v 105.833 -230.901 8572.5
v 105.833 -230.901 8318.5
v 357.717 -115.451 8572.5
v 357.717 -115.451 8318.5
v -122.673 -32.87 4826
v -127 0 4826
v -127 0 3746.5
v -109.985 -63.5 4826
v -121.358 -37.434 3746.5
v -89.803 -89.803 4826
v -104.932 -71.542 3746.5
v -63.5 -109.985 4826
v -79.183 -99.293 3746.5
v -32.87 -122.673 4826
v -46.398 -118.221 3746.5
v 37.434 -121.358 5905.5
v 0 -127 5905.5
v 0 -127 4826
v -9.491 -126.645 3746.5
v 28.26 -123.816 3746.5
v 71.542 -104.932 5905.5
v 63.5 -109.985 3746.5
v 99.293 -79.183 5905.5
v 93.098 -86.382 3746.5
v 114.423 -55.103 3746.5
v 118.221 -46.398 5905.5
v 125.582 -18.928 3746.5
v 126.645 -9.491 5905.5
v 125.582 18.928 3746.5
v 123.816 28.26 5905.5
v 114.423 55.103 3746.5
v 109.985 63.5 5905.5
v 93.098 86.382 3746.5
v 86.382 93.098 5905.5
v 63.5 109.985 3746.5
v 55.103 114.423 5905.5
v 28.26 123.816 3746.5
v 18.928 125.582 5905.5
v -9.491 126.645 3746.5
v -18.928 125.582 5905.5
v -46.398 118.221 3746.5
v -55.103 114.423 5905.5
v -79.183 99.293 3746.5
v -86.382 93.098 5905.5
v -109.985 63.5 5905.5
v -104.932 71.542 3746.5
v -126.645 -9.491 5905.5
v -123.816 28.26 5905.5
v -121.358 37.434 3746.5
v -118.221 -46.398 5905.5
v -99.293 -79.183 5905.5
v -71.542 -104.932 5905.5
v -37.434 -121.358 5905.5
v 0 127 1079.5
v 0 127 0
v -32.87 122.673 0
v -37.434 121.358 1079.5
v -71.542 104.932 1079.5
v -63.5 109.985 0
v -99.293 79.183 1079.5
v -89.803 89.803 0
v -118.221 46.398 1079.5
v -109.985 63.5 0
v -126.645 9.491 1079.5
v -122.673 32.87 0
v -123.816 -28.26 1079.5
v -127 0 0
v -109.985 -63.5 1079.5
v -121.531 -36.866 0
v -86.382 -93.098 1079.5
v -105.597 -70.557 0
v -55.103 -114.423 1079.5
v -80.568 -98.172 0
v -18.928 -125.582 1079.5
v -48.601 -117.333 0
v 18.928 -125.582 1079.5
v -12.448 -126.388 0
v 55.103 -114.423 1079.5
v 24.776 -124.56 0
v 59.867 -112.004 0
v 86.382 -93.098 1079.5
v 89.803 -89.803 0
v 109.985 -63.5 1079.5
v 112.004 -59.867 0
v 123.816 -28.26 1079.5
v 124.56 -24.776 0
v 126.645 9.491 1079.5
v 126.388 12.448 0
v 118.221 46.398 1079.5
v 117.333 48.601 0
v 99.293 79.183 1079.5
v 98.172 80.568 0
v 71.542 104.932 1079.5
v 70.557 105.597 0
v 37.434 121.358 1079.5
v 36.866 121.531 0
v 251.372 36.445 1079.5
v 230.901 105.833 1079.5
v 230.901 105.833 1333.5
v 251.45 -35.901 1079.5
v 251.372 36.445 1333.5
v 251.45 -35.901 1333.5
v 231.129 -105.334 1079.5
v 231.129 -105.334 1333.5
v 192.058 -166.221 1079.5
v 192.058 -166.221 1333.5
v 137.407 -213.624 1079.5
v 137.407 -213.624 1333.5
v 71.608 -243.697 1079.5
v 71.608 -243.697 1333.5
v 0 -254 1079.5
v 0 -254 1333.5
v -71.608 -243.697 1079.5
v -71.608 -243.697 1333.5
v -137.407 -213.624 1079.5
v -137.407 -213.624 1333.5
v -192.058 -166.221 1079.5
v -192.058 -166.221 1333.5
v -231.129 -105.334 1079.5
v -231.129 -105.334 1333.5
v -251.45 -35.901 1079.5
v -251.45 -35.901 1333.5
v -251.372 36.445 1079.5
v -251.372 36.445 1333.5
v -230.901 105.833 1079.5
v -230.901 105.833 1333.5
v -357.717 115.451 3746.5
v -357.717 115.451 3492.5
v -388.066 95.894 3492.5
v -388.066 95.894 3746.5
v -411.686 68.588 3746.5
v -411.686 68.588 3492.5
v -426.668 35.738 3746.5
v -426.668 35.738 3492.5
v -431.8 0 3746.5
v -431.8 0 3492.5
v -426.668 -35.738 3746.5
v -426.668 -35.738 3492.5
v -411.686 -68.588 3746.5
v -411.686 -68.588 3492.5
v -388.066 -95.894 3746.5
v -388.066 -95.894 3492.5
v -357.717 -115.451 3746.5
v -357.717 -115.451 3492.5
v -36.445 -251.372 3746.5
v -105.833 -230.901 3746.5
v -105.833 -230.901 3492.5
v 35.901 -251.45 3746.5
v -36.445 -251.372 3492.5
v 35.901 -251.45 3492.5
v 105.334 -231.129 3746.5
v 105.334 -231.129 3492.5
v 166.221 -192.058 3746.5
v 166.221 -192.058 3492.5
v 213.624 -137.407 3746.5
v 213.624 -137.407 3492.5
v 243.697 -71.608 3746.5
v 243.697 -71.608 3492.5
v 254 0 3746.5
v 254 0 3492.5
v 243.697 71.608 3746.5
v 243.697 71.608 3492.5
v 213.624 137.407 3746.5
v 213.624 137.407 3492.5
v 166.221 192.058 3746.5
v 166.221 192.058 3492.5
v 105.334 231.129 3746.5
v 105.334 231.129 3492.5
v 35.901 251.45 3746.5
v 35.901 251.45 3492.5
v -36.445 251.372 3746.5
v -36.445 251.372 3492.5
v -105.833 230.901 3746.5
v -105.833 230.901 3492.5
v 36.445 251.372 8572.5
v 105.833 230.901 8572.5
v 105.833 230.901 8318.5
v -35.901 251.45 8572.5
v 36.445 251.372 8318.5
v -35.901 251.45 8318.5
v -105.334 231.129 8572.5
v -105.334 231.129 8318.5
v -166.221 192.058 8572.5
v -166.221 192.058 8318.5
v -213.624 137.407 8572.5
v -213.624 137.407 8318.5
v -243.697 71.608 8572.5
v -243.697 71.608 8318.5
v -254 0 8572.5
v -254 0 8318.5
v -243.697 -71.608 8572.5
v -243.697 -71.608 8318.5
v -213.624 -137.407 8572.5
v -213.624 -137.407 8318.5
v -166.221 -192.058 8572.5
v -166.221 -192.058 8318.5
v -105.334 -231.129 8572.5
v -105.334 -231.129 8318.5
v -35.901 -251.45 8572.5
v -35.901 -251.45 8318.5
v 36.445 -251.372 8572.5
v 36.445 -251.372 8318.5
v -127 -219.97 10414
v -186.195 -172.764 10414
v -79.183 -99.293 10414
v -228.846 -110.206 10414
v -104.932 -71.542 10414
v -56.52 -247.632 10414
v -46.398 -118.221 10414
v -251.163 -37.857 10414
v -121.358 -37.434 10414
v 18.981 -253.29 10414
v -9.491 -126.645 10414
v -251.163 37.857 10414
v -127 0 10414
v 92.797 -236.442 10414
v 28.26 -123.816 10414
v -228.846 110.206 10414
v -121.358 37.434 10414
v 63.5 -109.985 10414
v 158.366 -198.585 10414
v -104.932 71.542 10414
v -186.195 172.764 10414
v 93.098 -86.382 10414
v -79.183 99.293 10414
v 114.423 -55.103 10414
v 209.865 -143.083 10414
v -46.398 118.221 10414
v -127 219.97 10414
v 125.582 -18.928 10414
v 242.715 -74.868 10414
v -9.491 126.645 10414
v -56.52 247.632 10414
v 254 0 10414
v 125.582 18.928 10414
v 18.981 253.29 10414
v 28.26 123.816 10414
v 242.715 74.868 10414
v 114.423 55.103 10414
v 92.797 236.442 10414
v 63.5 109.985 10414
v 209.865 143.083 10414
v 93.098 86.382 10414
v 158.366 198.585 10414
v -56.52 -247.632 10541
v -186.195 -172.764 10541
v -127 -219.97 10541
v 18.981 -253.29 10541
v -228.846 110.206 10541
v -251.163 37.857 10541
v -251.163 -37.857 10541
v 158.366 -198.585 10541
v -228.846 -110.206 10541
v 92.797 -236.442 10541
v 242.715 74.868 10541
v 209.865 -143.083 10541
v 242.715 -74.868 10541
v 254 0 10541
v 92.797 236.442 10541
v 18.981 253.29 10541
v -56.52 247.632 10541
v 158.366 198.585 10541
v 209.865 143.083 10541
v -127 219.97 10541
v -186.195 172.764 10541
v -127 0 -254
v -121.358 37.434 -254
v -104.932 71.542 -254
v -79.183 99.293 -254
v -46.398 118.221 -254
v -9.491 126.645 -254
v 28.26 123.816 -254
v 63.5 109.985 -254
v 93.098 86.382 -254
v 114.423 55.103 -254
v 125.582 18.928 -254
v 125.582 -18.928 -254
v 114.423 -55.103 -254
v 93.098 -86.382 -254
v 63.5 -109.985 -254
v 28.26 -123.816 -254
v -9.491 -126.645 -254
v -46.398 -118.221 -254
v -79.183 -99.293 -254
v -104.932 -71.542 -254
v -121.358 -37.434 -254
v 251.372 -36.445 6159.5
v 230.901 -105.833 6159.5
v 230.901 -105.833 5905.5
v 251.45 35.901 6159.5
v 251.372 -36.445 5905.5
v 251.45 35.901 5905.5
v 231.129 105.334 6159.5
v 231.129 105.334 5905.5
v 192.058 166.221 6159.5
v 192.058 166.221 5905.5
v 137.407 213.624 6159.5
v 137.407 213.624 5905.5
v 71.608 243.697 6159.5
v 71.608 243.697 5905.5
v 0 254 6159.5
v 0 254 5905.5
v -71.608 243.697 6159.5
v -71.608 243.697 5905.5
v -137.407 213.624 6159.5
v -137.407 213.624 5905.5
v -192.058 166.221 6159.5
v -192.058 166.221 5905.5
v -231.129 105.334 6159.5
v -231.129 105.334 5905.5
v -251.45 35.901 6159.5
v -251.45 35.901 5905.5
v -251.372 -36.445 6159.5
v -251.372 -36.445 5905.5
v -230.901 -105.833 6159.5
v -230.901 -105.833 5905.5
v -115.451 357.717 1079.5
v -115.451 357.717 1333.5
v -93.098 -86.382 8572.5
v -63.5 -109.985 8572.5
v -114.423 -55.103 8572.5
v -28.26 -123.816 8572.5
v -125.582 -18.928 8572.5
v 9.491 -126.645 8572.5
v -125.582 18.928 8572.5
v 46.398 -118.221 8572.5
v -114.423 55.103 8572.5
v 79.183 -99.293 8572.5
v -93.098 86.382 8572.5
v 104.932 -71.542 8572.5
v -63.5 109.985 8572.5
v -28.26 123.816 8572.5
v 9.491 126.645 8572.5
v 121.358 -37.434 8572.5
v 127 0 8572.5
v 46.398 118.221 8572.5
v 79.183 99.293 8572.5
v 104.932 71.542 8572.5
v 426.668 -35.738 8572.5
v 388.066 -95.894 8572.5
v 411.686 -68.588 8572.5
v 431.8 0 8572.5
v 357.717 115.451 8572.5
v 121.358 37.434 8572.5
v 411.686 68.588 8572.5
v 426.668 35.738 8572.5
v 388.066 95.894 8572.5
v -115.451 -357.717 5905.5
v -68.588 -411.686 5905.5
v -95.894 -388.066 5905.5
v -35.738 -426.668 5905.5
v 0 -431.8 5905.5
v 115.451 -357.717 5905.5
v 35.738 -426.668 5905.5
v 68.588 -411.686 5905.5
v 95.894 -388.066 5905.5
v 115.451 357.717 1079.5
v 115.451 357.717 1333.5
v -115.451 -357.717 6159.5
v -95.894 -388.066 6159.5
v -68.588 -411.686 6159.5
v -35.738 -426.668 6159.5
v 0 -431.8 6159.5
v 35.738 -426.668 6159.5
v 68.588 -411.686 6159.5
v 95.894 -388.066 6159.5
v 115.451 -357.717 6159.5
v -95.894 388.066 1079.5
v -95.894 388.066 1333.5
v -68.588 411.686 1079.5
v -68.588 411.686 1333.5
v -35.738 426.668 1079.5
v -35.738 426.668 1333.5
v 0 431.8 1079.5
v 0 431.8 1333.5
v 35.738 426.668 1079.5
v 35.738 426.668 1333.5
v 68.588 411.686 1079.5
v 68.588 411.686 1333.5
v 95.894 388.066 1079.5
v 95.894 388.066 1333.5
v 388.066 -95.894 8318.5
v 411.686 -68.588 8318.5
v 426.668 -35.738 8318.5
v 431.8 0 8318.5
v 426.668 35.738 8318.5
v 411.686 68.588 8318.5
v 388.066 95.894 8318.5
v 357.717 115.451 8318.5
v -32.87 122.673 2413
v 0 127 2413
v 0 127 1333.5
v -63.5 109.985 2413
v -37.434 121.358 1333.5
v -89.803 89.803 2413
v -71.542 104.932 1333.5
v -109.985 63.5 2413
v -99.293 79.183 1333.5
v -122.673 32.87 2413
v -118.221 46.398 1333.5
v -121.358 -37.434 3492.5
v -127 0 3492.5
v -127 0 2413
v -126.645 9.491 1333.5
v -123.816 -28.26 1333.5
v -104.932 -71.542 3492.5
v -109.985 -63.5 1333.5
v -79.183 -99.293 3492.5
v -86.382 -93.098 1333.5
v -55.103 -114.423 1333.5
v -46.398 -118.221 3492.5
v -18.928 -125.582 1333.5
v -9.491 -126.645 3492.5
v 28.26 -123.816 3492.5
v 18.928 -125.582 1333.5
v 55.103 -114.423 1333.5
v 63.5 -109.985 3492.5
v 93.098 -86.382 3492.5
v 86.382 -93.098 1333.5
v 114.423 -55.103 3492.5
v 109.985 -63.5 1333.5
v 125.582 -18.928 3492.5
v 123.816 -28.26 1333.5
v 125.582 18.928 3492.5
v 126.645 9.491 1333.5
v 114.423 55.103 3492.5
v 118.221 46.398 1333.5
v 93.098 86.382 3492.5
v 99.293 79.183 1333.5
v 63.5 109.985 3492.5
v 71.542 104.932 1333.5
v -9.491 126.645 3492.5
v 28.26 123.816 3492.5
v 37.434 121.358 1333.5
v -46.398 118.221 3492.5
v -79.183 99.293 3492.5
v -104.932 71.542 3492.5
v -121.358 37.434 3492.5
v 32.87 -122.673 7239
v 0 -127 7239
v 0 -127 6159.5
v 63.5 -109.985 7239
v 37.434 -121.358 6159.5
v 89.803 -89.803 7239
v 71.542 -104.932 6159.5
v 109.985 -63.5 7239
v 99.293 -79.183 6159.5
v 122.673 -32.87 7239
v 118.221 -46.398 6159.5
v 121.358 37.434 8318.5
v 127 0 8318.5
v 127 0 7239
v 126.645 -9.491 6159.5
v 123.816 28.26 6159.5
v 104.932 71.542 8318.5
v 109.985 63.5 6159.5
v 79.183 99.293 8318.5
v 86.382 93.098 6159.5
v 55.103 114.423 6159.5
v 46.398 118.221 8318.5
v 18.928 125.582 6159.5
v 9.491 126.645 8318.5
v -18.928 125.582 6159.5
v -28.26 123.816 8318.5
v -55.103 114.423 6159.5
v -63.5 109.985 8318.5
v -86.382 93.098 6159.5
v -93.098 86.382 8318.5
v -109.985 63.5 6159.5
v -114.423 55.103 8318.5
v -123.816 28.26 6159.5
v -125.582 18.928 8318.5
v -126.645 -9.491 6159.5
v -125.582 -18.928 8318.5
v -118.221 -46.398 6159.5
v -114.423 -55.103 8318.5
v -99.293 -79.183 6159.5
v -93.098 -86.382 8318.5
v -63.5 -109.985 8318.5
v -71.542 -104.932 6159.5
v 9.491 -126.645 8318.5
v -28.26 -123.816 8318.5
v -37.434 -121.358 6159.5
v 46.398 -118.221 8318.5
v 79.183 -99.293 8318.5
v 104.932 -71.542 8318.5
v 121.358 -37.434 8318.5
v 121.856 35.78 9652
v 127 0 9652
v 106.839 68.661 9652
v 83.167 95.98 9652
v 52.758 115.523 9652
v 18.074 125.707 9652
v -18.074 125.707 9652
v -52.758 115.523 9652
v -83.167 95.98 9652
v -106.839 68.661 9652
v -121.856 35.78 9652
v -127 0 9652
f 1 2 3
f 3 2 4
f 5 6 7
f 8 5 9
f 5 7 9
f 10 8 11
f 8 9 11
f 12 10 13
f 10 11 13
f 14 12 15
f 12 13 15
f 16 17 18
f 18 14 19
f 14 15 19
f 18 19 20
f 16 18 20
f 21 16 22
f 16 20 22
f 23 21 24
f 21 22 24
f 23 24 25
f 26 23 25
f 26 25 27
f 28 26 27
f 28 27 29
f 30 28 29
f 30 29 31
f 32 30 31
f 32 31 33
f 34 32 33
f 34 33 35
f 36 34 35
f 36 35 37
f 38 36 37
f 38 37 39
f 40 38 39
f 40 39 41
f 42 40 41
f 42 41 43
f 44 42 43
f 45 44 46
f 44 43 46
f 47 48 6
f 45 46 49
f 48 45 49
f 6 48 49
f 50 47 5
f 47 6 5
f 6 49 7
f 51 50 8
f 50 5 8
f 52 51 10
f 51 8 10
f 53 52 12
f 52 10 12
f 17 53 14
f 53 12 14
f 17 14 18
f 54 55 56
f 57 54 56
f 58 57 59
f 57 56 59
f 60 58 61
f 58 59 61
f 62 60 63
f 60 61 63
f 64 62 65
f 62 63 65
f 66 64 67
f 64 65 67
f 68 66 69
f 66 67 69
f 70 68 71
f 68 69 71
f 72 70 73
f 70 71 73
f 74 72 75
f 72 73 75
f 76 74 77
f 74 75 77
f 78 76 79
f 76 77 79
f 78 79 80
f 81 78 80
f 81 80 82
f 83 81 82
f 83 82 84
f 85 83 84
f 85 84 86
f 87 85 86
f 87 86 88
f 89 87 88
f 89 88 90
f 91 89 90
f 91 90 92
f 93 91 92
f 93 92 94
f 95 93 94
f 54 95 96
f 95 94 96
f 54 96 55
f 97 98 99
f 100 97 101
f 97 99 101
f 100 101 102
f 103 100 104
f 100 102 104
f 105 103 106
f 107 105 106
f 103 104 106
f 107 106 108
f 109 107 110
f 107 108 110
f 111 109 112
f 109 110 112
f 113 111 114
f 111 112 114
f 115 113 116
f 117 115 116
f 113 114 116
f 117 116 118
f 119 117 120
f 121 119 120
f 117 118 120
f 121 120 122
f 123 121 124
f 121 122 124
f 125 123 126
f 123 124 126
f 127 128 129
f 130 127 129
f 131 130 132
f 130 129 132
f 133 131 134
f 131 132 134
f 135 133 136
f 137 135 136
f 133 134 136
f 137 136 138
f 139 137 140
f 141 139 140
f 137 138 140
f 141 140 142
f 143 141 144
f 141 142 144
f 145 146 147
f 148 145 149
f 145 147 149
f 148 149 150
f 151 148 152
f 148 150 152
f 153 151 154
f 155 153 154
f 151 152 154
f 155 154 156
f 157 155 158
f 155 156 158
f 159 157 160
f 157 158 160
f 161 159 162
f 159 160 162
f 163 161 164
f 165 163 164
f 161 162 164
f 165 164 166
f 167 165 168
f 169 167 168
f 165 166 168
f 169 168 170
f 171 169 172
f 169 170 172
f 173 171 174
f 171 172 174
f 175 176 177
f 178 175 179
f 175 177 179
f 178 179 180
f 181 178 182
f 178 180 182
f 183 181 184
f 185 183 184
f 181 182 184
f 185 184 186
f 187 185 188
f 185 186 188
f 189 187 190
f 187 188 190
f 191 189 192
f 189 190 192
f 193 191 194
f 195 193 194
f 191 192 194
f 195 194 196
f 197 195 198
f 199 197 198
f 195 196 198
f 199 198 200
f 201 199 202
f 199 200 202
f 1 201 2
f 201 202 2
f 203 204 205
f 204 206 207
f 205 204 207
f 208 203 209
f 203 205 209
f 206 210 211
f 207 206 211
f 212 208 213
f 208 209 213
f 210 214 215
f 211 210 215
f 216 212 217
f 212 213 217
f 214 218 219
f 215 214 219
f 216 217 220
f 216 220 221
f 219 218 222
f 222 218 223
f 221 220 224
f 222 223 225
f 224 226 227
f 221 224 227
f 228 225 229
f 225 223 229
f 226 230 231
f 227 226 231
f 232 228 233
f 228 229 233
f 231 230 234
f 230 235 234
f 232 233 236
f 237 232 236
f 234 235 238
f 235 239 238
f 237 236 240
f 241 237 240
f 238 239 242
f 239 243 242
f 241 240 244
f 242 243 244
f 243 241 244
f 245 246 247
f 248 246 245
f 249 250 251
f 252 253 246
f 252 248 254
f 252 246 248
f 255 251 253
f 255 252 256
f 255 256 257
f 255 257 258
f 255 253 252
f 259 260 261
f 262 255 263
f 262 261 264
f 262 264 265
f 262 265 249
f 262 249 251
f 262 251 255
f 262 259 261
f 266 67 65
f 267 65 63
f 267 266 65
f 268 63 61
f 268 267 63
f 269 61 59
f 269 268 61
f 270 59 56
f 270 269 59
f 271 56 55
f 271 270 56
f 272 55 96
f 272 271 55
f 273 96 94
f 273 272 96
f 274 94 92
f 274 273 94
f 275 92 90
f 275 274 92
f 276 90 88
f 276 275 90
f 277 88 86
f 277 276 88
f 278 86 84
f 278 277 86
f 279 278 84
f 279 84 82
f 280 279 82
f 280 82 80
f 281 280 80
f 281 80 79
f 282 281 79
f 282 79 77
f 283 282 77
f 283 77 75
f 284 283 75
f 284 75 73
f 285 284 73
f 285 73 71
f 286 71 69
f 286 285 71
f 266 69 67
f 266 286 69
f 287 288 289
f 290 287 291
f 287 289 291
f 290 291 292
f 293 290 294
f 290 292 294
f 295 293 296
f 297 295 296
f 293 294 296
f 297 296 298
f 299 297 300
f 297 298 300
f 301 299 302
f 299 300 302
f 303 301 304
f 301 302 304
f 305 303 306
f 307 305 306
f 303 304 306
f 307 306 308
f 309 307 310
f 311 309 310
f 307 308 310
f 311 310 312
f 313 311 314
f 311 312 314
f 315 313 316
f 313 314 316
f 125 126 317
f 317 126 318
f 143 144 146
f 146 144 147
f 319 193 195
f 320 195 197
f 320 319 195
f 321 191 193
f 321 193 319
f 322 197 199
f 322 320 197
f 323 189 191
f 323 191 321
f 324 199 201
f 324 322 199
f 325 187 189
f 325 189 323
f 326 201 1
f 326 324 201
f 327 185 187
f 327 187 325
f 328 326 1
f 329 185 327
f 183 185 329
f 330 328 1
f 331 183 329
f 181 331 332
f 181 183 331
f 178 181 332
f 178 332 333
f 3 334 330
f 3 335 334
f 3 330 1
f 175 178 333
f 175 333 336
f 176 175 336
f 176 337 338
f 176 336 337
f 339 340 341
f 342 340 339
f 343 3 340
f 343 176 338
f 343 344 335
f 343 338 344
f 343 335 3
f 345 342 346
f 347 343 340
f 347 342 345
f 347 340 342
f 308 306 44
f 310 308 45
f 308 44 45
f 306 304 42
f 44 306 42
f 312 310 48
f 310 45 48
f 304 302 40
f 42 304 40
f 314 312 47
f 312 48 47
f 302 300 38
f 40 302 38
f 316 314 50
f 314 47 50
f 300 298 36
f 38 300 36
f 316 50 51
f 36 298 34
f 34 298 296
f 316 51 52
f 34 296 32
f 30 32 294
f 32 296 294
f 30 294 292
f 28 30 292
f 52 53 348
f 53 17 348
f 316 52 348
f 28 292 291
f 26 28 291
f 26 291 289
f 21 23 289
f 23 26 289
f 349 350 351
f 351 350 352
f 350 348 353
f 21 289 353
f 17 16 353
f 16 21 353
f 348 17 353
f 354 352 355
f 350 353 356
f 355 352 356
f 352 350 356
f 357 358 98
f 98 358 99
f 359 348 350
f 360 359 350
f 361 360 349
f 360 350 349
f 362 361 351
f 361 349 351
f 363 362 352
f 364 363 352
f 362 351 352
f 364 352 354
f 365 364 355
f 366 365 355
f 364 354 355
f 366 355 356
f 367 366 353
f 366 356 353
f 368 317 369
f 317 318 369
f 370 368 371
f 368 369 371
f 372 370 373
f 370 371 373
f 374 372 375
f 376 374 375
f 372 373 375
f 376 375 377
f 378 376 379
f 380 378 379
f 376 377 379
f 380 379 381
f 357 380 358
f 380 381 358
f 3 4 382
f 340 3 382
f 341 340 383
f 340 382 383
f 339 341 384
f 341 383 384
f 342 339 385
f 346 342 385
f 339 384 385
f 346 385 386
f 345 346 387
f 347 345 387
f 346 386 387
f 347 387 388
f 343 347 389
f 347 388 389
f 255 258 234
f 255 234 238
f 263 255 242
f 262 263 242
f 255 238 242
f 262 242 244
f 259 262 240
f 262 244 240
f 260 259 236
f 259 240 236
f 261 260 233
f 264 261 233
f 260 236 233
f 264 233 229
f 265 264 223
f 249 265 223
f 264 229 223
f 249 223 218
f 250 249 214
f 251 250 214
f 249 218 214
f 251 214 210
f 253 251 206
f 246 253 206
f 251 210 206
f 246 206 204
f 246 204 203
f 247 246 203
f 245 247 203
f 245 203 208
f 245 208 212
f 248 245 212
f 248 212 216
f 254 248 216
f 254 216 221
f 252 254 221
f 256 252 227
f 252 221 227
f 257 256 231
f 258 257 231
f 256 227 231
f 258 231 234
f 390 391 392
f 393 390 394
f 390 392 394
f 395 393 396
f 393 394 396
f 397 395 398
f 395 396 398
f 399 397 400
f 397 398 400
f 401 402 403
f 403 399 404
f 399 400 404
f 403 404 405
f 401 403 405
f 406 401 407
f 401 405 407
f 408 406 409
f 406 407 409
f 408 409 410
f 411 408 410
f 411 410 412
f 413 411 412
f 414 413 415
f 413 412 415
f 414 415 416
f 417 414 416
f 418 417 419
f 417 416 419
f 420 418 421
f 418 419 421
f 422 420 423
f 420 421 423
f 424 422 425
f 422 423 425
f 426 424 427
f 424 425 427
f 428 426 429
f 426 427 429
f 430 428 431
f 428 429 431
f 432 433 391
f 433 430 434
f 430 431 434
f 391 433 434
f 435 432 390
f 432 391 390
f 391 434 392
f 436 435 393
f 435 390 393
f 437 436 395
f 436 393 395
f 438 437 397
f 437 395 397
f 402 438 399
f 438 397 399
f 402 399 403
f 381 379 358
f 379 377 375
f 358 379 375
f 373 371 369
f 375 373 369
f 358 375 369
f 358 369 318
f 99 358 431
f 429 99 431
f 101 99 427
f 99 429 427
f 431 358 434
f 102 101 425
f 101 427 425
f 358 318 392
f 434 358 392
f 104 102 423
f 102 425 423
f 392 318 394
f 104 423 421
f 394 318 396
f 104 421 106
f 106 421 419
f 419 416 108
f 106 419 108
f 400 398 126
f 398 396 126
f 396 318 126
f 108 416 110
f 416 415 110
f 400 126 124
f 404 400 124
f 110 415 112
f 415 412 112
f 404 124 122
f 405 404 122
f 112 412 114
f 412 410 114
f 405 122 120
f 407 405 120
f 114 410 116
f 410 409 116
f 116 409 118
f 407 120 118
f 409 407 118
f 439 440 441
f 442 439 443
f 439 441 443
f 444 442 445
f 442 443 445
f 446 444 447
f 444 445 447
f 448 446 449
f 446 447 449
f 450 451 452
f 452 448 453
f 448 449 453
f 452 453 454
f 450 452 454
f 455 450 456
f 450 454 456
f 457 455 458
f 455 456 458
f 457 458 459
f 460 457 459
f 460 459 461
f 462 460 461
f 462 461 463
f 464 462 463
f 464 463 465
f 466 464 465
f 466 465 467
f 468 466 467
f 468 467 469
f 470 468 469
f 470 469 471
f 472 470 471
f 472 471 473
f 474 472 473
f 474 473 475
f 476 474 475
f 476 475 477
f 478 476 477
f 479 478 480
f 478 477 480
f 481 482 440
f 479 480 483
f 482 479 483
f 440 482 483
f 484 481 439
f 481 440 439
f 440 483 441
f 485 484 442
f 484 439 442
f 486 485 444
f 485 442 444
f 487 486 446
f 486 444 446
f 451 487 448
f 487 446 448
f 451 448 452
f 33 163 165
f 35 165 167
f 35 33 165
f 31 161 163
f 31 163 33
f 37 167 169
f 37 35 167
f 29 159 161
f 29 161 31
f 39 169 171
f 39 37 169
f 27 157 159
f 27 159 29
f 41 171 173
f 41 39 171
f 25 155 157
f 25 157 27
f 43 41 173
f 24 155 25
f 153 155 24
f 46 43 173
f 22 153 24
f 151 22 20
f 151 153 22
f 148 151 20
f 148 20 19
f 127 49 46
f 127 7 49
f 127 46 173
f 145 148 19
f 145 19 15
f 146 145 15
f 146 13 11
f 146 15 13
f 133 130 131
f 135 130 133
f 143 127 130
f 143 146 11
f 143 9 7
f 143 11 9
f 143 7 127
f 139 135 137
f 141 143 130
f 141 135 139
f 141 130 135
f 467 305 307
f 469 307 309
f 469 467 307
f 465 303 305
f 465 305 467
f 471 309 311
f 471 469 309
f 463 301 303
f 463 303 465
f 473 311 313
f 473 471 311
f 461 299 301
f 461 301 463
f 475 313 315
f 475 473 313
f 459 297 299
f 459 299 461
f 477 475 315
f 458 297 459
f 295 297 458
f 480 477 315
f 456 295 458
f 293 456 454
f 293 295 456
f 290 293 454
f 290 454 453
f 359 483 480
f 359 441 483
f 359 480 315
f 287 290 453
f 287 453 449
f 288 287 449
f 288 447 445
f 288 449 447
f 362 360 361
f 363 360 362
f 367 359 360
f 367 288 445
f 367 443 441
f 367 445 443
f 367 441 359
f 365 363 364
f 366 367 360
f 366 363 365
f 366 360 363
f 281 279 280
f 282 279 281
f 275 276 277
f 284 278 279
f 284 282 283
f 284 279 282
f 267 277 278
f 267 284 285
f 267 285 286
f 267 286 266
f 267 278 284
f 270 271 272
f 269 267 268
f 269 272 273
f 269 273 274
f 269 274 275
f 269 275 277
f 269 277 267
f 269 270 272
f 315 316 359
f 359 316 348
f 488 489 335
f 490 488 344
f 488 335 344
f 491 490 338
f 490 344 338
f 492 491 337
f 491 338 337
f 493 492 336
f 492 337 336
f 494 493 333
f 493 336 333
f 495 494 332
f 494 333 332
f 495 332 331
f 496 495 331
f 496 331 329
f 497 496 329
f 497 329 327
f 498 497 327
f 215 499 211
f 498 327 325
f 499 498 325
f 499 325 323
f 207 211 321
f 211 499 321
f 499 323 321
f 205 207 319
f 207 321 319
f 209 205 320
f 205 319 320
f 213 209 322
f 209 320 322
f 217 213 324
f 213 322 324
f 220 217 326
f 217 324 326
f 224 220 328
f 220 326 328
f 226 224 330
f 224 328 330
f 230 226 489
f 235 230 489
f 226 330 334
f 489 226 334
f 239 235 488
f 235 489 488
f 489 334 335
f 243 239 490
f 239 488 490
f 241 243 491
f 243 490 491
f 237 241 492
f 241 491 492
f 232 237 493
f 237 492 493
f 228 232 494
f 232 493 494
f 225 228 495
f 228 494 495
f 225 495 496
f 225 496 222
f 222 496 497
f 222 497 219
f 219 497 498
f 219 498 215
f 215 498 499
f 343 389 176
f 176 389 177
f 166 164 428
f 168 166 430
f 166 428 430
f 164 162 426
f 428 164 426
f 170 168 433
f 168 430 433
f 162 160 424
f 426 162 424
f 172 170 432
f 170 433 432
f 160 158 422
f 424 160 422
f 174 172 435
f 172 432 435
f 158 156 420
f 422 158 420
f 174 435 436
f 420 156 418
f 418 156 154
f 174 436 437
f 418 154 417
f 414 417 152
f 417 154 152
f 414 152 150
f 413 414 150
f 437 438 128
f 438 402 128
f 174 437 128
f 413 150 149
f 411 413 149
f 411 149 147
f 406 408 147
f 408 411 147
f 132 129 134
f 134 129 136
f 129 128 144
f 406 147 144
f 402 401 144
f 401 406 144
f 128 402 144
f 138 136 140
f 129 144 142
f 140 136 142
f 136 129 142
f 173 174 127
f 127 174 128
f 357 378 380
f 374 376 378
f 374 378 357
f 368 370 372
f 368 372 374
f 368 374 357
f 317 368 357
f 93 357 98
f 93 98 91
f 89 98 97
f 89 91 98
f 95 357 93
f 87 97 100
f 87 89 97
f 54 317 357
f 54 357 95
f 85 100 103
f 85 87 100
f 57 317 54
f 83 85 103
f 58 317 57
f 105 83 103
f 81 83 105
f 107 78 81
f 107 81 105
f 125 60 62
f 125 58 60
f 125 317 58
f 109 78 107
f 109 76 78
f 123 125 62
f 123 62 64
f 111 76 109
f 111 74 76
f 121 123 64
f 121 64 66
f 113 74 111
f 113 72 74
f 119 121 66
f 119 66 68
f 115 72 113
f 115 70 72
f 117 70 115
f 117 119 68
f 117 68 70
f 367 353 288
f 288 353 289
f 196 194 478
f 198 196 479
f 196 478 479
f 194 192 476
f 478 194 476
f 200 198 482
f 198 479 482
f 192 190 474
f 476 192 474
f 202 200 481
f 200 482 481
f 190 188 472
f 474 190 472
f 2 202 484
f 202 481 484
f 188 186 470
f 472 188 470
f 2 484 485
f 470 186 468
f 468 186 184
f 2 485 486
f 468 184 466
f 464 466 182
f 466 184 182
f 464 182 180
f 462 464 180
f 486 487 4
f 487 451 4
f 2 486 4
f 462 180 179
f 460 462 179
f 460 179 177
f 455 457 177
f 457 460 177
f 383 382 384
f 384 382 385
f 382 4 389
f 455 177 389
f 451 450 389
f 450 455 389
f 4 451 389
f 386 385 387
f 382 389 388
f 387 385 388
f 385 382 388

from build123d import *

# Parameters (mm, degrees)
SKETCH1_R                   = 127
BOSS_EXTRUDE1_DEPTH         = 2413
BOSS_EXTRUDE2_DEPTH         = 127
BODY_MOVE_COPY1_START       = 7239
BODY_MOVE_COPY1_OUTLINE_R   = 127
BODY_MOVE_COPY1_DEPTH       = 2413
BODY_MOVE_COPY1_START_2     = 8318.5
BODY_MOVE_COPY1_2_OUTLINE_R = 127
BODY_MOVE_COPY1_2_DEPTH     = 254
BODY_MOVE_COPY1_START_3     = 2413
BODY_MOVE_COPY1_3_OUTLINE_R = 127
BODY_MOVE_COPY1_3_DEPTH     = 2413
BODY_MOVE_COPY1_START_4     = 3492.5
BODY_MOVE_COPY1_4_OUTLINE_R = 127
BODY_MOVE_COPY1_4_DEPTH     = 254
BODY_MOVE_COPY1_START_5     = 4826
BODY_MOVE_COPY1_5_OUTLINE_R = 127
BODY_MOVE_COPY1_5_DEPTH     = 2413
BODY_MOVE_COPY1_START_6     = 5905.5
BODY_MOVE_COPY1_6_OUTLINE_R = 127
BODY_MOVE_COPY1_6_DEPTH     = 254
BODY_MOVE_COPY2_ANGLE       = 90
BODY_MOVE_COPY3_ANGLE       = 180
BODY_MOVE_COPY4_ANGLE       = 90
BOSS_EXTRUDE3_START         = 254
SKETCH4_R                   = 127
BOSS_EXTRUDE3_DEPTH         = 254
SKETCH5_R                   = 127
BOSS_EXTRUDE4_DEPTH         = 762
SKETCH6_R                   = 254
BOSS_EXTRUDE5_DEPTH         = 127


# Read off the part's stored shape, not the designer's step: Body-Move/Copy1
with BuildPart() as part:
    # Sketch1 → Boss-Extrude1 (new body)
    with BuildSketch(Plane.XY):
        Circle(SKETCH1_R)
    extrude(amount=BOSS_EXTRUDE1_DEPTH)

    # Sketch2 → Boss-Extrude2 (add, symmetric)
    with BuildSketch(Plane.XY.offset(1206.5)):
        with BuildLine():
            Line((105.833333333, 230.901073093), (357.716666667, 115.450536547))
            ThreePointArc((357.716666667, 115.450536547), (431.8, 0), (357.716666667, -115.450536547))
            Line((357.716666667, -115.450536547), (105.833333333, -230.901073093))
            ThreePointArc((105.833333333, -230.901073093), (-254, 0), (105.833333333, 230.901073093))
        make_face()
    extrude(amount=BOSS_EXTRUDE2_DEPTH, both=True)


with BuildPart() as body_2:
    # Body-Move/Copy1 outline → Body-Move/Copy1 (new body)
    with BuildSketch(Plane.XY.offset(BODY_MOVE_COPY1_START)):
        Circle(BODY_MOVE_COPY1_OUTLINE_R)
    extrude(amount=BODY_MOVE_COPY1_DEPTH)

    # Body-Move_Copy1 2 outline → Body-Move_Copy1 2 (add)
    with BuildSketch(Plane.XY.offset(BODY_MOVE_COPY1_START_2)):
        with BuildLine():
            ThreePointArc((105.833333333, 230.901073093), (-254, 0), (105.833333333, -230.901073093))
            Line((105.833333333, -230.901073093), (357.716666667, -115.450536547))
            ThreePointArc((357.716666667, -115.450536547), (431.8, 0), (357.716666667, 115.450536547))
            Line((357.716666667, 115.450536547), (105.833333333, 230.901073093))
        make_face()
        Circle(BODY_MOVE_COPY1_2_OUTLINE_R, mode=Mode.SUBTRACT)
    extrude(amount=BODY_MOVE_COPY1_2_DEPTH)


with BuildPart() as body_3:
    # Body-Move_Copy1 3 outline → Body-Move_Copy1 3 (new body)
    with BuildSketch(Plane.XY.offset(BODY_MOVE_COPY1_START_3)):
        Circle(BODY_MOVE_COPY1_3_OUTLINE_R)
    extrude(amount=BODY_MOVE_COPY1_3_DEPTH)

    # Body-Move_Copy1 4 outline → Body-Move_Copy1 4 (add)
    with BuildSketch(Plane.XY.offset(BODY_MOVE_COPY1_START_4)):
        with BuildLine():
            ThreePointArc((105.833333333, 230.901073093), (-254, 0), (105.833333333, -230.901073093))
            Line((105.833333333, -230.901073093), (357.716666667, -115.450536547))
            ThreePointArc((357.716666667, -115.450536547), (431.8, 0), (357.716666667, 115.450536547))
            Line((357.716666667, 115.450536547), (105.833333333, 230.901073093))
        make_face()
        Circle(BODY_MOVE_COPY1_4_OUTLINE_R, mode=Mode.SUBTRACT)
    extrude(amount=BODY_MOVE_COPY1_4_DEPTH)


with BuildPart() as body_4:
    # Body-Move_Copy1 5 outline → Body-Move_Copy1 5 (new body)
    with BuildSketch(Plane.XY.offset(BODY_MOVE_COPY1_START_5)):
        Circle(BODY_MOVE_COPY1_5_OUTLINE_R)
    extrude(amount=BODY_MOVE_COPY1_5_DEPTH)

    # Body-Move_Copy1 6 outline → Body-Move_Copy1 6 (add)
    with BuildSketch(Plane.XY.offset(BODY_MOVE_COPY1_START_6)):
        with BuildLine():
            ThreePointArc((105.833333333, 230.901073093), (-254, 0), (105.833333333, -230.901073093))
            Line((105.833333333, -230.901073093), (357.716666667, -115.450536547))
            ThreePointArc((357.716666667, -115.450536547), (431.8, 0), (357.716666667, 115.450536547))
            Line((357.716666667, 115.450536547), (105.833333333, 230.901073093))
        make_face()
        Circle(BODY_MOVE_COPY1_6_OUTLINE_R, mode=Mode.SUBTRACT)
    extrude(amount=BODY_MOVE_COPY1_6_DEPTH)


with BuildPart() as body_4_1:
    # Body-Move/Copy2: moved
    add(body_4.part.rotate(Axis((0, 0, 0), (0, 0, -1)), BODY_MOVE_COPY2_ANGLE))


with BuildPart() as body_3_1:
    # Body-Move/Copy3: moved
    add(body_3.part.rotate(Axis((0, 0, 0), (0, 0, 1)), BODY_MOVE_COPY3_ANGLE))


with BuildPart() as part_1:
    # Body-Move/Copy4: moved
    add(part.part.rotate(Axis((0, 0, 0), (0, 0, 1)), BODY_MOVE_COPY4_ANGLE))

    # Combine1: union body 2, body 4, body 3
    add(body_2.part)
    add(body_4_1.part)
    add(body_3_1.part)

    # Sketch4 → Boss-Extrude3 (add)
    with BuildSketch(Plane(origin=(0, 0, 0), x_dir=(-1, 0, 0), z_dir=(0, 0, -1)).offset(BOSS_EXTRUDE3_START)):
        Circle(SKETCH4_R)
    extrude(amount=-BOSS_EXTRUDE3_DEPTH)

    # Sketch5 → Boss-Extrude4 (add)
    with BuildSketch(Plane.XY.offset(9652)):
        with Locations(Location((0, 0, 0), (0, 0, 180))):
            Circle(SKETCH5_R)
    extrude(amount=BOSS_EXTRUDE4_DEPTH)

    # Sketch6 → Boss-Extrude5 (add)
    with BuildSketch(Plane.XY.offset(10414)):
        Circle(SKETCH6_R)
    extrude(amount=BOSS_EXTRUDE5_DEPTH)


solid = part_1.part
